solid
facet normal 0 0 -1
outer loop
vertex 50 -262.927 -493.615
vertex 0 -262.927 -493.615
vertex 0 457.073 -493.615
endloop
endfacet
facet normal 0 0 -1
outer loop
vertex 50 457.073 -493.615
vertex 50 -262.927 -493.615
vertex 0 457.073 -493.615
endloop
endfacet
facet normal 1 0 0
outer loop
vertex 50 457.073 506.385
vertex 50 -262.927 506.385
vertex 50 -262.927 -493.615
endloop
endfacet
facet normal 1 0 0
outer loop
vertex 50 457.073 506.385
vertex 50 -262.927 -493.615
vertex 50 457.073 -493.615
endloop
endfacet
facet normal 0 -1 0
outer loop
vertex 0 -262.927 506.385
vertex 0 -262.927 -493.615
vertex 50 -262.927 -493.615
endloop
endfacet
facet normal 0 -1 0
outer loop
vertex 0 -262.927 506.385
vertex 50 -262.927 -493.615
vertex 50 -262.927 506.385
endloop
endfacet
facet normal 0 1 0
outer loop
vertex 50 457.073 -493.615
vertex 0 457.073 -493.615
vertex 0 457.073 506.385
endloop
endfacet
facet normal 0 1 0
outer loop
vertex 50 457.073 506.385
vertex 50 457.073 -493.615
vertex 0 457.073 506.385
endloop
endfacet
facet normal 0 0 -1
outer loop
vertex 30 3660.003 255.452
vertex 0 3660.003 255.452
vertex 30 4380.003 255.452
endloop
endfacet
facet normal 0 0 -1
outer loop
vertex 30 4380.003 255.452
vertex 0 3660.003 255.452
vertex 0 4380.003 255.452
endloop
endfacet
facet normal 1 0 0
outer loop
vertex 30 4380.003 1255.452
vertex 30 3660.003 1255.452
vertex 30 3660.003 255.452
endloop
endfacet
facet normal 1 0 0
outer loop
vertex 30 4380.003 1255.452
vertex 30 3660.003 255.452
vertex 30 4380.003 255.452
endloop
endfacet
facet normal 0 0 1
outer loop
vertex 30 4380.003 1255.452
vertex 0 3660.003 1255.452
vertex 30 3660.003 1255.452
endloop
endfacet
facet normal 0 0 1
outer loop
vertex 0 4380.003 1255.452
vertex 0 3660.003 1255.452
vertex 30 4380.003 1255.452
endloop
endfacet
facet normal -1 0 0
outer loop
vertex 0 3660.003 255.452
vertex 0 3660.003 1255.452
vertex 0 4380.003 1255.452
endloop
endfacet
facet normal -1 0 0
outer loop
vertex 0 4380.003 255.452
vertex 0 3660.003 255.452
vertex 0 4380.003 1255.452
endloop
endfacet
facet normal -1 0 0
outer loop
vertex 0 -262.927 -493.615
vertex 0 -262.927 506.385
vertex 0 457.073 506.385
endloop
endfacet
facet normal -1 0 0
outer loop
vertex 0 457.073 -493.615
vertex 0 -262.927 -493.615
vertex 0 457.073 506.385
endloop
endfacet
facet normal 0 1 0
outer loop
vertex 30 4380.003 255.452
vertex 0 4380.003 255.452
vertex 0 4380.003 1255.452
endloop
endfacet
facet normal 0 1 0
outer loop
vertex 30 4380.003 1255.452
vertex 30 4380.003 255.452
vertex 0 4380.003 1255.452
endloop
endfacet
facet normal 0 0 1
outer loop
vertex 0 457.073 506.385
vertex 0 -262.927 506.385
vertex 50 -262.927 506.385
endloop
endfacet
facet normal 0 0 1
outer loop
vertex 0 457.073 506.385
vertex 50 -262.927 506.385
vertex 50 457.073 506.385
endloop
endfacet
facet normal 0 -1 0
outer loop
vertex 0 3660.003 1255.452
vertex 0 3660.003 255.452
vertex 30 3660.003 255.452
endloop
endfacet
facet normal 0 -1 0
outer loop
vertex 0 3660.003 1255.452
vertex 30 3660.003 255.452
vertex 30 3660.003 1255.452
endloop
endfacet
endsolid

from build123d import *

# Parameters (mm, degrees)
F0_W     = 720
F0_H     = 1000
F1_DEPTH = 50
F2_W     = 720
F2_H     = 1000
F3_DEPTH = 30


with BuildPart() as f1:
    # F0 (on Right) → F1 (new body)
    with BuildSketch(Plane.YZ):
        with Locations((97.072705, 6.385373)):
            Rectangle(F0_W, F0_H)
    extrude(amount=F1_DEPTH)


with BuildPart() as f3:
    # F2 (on face) → F3 (new body)
    with BuildSketch(Plane.YZ):
        with Locations((4020.002955, 755.452067)):
            Rectangle(F2_W, F2_H)
    extrude(amount=F3_DEPTH)


solid = Compound([f1.part, f3.part])
